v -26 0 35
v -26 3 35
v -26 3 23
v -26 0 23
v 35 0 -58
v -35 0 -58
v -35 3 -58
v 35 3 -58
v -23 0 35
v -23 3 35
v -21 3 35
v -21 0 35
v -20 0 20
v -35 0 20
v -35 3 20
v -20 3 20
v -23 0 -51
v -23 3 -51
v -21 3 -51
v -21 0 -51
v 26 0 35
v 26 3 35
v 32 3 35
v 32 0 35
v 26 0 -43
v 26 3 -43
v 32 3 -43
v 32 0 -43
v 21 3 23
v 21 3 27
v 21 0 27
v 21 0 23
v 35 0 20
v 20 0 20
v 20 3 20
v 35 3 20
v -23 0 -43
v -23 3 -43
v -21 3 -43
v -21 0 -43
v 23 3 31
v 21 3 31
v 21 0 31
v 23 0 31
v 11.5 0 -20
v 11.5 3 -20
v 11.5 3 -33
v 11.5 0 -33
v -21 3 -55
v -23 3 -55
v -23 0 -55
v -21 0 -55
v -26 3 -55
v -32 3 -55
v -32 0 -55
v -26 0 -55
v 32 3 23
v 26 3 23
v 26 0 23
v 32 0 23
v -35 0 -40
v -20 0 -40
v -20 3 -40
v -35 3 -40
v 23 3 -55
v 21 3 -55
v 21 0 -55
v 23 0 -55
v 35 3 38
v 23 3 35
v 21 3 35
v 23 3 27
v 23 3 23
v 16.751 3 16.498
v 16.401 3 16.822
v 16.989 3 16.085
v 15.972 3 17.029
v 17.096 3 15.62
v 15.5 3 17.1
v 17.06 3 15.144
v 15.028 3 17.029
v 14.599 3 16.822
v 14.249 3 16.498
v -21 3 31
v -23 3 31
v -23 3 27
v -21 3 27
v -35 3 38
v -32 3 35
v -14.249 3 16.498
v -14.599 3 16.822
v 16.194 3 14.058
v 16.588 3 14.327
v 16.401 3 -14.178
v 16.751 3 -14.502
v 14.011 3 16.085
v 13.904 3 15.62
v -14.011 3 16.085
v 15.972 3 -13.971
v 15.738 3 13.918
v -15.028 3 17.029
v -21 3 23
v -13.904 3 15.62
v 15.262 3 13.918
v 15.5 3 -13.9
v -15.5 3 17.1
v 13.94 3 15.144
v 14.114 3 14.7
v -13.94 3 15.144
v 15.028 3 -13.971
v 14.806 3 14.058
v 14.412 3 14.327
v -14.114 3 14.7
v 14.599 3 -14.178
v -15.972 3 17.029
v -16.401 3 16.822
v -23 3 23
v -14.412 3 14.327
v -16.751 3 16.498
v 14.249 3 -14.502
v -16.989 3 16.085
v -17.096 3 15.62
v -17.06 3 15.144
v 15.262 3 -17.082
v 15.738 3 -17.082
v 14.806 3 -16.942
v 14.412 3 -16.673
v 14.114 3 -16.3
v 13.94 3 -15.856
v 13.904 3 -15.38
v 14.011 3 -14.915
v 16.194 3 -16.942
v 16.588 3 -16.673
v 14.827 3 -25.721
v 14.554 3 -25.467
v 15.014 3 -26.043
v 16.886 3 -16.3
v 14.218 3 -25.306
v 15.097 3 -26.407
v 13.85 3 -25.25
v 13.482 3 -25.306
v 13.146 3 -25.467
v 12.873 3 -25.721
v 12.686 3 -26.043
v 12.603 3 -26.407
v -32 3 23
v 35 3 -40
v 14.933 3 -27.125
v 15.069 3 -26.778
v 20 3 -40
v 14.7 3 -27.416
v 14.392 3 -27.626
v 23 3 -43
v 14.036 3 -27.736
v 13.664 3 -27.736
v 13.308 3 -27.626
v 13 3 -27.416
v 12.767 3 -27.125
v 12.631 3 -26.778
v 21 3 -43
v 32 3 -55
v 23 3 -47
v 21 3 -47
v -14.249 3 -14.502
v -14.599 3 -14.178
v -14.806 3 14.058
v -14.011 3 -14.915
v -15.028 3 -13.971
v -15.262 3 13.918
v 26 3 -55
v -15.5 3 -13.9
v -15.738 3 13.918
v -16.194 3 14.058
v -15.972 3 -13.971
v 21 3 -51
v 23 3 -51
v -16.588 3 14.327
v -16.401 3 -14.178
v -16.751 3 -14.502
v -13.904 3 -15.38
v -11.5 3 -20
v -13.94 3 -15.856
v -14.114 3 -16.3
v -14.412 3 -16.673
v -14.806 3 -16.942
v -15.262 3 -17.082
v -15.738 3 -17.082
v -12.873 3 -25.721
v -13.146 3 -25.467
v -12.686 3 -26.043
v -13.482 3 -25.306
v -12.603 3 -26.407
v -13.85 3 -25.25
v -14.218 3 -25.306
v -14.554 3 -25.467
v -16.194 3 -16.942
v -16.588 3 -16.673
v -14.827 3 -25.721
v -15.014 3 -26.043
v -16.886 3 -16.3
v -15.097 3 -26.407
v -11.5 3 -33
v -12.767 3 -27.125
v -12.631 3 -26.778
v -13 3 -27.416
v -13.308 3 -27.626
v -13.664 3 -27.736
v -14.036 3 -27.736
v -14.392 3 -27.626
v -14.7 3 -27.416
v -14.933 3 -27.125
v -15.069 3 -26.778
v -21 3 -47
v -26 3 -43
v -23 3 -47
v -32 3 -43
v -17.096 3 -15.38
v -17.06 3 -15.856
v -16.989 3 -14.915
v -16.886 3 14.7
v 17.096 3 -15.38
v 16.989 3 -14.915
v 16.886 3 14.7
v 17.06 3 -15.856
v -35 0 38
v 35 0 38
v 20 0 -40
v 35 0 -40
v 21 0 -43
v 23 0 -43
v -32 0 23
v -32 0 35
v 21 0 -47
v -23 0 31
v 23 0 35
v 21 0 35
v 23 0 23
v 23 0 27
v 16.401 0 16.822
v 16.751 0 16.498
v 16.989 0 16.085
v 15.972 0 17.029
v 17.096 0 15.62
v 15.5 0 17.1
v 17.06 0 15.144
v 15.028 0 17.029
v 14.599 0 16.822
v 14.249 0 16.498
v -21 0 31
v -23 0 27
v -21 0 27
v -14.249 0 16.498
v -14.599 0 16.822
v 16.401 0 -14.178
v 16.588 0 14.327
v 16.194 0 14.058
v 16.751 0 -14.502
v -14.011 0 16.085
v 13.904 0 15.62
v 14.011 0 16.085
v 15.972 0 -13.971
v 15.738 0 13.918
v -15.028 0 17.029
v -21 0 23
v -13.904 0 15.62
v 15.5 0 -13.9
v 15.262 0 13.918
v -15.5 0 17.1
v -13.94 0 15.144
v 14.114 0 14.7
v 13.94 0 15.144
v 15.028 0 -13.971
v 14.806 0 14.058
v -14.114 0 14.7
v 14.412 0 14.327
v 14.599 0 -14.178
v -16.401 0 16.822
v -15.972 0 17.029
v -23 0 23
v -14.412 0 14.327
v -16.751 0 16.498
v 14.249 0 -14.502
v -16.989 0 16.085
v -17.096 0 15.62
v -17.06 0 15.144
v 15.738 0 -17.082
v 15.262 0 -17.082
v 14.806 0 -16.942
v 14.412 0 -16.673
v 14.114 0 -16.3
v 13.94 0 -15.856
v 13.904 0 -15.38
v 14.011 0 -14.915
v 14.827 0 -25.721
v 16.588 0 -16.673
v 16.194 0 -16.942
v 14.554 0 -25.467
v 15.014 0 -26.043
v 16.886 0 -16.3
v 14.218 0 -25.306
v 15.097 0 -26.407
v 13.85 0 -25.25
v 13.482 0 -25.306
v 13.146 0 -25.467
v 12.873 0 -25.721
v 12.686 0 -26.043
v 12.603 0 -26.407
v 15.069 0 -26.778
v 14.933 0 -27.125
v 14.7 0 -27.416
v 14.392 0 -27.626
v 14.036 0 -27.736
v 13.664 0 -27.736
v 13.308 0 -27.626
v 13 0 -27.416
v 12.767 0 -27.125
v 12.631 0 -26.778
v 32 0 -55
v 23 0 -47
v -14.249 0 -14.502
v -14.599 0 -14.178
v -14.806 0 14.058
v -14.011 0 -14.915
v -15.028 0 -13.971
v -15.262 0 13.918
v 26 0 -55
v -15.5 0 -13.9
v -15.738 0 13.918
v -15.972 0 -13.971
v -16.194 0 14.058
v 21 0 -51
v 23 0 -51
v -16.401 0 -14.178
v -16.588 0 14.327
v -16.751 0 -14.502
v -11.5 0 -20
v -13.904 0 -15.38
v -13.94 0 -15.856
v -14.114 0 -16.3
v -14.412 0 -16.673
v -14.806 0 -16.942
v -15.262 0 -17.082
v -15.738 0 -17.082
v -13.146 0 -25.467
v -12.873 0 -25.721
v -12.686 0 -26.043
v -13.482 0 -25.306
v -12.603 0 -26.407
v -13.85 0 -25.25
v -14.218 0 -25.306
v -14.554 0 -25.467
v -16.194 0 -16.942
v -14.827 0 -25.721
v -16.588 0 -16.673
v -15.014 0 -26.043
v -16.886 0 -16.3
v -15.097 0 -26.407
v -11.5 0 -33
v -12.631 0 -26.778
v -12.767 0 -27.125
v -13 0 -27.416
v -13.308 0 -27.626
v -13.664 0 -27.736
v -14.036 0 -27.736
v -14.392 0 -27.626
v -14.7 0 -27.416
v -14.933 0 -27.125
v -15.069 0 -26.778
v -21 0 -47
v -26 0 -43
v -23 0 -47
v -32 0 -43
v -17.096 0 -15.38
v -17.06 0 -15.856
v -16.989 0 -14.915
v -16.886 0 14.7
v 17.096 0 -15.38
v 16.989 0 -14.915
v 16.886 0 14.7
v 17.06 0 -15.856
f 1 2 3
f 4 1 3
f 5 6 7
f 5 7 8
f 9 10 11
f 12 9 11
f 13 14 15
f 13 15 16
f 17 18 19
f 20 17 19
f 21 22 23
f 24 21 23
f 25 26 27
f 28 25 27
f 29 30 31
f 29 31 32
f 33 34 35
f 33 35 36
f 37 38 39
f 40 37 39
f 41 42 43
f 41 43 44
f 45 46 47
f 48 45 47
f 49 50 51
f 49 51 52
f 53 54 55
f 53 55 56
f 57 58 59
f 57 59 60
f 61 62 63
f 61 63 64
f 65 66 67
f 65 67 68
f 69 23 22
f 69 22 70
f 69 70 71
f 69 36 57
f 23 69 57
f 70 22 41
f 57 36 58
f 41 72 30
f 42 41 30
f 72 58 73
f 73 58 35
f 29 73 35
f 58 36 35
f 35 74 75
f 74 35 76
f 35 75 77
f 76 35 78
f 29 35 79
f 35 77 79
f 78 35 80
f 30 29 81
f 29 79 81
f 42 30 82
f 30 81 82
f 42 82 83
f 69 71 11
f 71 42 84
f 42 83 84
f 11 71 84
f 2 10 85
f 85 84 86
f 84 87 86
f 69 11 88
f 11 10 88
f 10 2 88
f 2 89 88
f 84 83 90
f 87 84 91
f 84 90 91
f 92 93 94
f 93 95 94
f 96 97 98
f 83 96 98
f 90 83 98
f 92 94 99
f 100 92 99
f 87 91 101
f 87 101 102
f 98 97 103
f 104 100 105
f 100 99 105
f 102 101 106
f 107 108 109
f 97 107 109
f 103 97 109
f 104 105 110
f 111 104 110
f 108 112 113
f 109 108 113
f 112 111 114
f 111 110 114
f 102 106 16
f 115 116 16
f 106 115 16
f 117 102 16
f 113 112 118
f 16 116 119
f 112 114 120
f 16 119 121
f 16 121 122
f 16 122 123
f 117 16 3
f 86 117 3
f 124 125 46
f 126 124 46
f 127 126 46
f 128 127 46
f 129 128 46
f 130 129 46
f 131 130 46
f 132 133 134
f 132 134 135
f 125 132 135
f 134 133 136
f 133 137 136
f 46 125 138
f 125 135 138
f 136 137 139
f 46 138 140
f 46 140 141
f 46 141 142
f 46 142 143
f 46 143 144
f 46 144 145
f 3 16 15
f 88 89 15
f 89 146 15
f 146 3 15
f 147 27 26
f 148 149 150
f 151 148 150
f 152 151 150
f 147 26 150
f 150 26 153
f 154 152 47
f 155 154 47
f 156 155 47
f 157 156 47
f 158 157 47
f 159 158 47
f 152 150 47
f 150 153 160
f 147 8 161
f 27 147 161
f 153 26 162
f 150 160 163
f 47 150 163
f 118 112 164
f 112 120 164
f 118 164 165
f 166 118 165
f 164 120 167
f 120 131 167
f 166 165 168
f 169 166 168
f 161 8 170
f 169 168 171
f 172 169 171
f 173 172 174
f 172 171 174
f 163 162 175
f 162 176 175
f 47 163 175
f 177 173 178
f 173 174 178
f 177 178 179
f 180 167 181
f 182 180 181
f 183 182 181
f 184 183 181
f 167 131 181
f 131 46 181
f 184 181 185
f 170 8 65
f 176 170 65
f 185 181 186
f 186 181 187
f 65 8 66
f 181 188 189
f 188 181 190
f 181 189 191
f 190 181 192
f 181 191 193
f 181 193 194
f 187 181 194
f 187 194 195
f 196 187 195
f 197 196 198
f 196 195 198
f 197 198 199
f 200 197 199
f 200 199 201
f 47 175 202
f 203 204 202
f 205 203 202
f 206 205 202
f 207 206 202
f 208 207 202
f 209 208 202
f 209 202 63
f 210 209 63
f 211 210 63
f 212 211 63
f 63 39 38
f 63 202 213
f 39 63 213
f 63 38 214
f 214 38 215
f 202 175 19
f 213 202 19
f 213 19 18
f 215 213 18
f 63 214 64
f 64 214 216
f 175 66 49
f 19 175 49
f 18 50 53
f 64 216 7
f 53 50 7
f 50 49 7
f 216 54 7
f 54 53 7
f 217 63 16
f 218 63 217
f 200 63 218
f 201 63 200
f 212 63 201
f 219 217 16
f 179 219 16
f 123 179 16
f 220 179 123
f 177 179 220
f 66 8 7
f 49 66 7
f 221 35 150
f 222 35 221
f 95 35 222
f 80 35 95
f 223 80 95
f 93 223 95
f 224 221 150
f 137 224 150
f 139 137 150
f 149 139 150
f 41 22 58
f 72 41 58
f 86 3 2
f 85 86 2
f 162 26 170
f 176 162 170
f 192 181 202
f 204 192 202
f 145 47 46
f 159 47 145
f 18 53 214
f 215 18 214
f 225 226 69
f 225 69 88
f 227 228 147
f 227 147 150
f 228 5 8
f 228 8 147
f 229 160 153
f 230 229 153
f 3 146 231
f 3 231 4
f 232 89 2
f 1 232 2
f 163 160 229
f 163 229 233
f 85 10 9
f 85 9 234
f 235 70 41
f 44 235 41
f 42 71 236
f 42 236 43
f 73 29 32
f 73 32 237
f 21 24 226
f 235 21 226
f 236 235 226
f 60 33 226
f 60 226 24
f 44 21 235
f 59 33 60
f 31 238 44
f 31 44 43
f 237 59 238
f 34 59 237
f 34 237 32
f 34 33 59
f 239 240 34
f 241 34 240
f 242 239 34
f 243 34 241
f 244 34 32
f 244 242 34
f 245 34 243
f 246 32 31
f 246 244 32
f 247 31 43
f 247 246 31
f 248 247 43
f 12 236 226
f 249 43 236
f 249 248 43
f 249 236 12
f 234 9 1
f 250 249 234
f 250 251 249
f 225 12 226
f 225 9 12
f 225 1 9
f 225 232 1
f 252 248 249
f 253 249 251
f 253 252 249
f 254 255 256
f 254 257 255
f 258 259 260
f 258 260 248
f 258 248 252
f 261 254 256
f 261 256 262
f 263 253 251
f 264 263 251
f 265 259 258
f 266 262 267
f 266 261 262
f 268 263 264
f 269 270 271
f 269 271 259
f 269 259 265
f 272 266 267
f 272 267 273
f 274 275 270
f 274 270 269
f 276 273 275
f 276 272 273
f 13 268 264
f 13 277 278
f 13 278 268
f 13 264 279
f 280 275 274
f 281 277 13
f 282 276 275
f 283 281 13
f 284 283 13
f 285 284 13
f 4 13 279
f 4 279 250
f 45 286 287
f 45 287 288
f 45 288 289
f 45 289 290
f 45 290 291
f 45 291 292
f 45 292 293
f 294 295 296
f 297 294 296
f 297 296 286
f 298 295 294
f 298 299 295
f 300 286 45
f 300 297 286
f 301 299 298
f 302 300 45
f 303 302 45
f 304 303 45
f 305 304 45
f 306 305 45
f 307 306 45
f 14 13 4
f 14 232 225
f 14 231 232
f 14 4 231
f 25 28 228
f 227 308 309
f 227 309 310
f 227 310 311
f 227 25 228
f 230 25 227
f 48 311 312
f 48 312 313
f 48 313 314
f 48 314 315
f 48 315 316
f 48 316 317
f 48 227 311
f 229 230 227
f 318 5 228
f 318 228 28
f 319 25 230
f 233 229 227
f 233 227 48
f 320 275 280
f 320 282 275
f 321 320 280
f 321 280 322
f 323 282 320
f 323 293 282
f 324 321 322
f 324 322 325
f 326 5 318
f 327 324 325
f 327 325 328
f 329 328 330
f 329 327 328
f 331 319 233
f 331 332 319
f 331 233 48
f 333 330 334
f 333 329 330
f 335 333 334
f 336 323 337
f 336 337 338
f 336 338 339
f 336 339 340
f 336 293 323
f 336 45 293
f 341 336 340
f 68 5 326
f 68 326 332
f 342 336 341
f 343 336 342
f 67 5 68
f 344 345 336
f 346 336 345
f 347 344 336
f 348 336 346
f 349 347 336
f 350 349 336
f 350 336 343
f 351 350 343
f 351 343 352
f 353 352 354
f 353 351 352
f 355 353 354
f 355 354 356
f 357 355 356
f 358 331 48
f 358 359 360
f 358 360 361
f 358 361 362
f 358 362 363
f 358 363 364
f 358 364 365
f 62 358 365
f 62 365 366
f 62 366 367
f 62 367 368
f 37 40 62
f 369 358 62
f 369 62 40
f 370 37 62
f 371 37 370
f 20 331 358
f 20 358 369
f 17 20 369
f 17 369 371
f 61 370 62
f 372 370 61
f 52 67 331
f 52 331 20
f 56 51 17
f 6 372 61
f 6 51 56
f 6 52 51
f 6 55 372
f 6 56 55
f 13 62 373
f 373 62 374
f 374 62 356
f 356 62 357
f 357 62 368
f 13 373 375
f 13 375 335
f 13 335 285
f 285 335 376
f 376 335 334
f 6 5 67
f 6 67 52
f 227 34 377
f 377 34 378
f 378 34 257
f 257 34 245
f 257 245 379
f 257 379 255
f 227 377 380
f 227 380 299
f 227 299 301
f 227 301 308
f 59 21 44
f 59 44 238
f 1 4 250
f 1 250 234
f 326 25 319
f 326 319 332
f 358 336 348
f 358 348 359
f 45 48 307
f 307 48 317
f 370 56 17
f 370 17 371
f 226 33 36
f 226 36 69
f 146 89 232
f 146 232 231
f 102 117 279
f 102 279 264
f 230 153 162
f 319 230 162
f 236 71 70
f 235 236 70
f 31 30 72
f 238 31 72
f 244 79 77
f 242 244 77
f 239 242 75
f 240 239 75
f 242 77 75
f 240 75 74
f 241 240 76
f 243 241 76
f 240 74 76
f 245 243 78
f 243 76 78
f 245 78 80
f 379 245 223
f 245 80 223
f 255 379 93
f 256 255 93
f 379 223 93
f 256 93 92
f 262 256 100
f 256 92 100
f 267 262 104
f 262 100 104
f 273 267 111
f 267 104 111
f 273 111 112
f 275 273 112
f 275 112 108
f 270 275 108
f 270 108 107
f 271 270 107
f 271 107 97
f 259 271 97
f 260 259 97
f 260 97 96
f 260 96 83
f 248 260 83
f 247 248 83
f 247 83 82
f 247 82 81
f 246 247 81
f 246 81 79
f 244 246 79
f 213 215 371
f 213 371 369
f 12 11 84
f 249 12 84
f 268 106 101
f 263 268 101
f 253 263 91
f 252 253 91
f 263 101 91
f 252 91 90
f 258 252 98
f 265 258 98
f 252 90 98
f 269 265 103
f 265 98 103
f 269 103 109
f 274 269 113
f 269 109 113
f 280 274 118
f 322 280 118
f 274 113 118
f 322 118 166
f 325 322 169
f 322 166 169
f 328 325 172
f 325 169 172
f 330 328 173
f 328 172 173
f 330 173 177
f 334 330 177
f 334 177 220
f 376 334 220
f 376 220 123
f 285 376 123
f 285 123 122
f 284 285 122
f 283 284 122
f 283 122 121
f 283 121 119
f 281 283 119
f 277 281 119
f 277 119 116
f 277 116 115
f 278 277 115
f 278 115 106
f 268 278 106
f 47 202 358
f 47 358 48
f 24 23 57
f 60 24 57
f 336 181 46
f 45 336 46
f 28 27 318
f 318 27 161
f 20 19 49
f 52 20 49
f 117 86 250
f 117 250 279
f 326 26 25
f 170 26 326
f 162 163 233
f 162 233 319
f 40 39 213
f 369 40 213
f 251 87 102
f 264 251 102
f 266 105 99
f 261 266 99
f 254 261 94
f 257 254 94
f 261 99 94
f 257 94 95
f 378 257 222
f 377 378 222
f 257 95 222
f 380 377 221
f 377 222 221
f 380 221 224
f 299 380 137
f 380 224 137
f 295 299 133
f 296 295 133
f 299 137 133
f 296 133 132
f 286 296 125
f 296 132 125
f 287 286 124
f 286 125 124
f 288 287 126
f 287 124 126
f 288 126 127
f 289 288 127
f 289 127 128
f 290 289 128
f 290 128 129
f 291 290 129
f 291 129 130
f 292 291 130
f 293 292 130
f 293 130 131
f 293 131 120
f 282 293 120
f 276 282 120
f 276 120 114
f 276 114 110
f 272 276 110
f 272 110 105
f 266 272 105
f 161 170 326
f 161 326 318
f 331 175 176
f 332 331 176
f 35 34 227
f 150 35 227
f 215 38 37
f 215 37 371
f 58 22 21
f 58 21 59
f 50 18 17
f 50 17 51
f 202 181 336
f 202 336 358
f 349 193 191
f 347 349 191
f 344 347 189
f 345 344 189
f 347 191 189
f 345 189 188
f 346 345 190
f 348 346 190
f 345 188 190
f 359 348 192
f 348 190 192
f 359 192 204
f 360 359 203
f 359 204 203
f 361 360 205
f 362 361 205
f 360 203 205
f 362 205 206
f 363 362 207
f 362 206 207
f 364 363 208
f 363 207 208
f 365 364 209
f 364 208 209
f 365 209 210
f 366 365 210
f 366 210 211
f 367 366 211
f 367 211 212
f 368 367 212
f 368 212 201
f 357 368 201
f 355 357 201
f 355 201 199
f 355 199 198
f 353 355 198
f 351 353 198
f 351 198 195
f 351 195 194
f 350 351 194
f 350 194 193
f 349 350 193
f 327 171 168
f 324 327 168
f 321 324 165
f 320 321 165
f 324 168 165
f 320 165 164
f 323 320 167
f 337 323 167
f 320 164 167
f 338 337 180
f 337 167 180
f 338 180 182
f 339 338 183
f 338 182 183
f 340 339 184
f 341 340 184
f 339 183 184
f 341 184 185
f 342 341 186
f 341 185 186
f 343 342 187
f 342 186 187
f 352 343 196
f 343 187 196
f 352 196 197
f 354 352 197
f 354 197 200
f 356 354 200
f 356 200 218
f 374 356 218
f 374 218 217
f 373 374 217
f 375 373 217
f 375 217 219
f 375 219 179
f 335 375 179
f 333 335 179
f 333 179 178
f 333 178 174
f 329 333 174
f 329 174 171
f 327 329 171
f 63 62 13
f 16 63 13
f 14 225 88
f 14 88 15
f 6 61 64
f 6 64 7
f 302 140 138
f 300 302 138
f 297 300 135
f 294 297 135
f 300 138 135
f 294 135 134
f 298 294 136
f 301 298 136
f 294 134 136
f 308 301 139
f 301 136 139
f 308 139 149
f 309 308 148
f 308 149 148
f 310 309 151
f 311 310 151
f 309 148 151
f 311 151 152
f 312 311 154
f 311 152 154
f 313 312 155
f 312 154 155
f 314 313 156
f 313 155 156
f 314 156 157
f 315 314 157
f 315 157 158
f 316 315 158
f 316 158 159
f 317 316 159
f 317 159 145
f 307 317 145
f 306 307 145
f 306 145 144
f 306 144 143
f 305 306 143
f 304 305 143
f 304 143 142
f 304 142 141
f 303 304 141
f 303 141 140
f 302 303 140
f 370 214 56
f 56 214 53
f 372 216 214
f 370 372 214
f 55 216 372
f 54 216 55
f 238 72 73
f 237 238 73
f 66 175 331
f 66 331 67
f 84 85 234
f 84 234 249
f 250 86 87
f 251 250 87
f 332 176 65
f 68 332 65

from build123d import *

# Parameters (mm, degrees)
EXTRUDE_1_DEPTH     = 3
CUT_EXTRUDE_1_REACH = 69.809
SKETCH_2_R          = 1.6
SKETCH_2_R_2        = 1.25
SKETCH_2_W          = 23
SKETCH_2_H          = 13
SKETCH_2_W_2        = 2
SKETCH_2_H_2        = 4
SKETCH_2_W_3        = 6
SKETCH_2_H_3        = 12


with BuildPart() as part:
    # 草图1 → 凸台-拉伸1 (new body)
    with BuildSketch(Plane(origin=(0, 0, 0), x_dir=(1, 0, 0), z_dir=(0, 1, 0))):
        Polygon((20, -20), (35, -20), (35, -38), (-35, -38), (-35, -20), (-20, -20), (-20, 20), (-20, 40), (-35, 40), (-35, 58), (35, 58), (35, 40), (20, 40), (20, 20), align=None)
    extrude(amount=EXTRUDE_1_DEPTH)

    # 草图2 → 切除-拉伸1 (cut, up to next)
    with BuildSketch(Plane(origin=(0, 3, 0), x_dir=(1, 0, 0), z_dir=(0, 1, 0)), mode=Mode.PRIVATE) as cut_extrude_1_sk1:
        with Locations(Location((-15.5, -15.5, 0), (0, 0, 270))):
            Circle(SKETCH_2_R)
    cut_extrude_1_tool1 = extrude(cut_extrude_1_sk1.sketch, amount=-CUT_EXTRUDE_1_REACH, mode=Mode.PRIVATE) & part.part
    # 草图2 → 切除-拉伸1 (cut, up to next)
    with BuildSketch(Plane(origin=(0, 3, 0), x_dir=(1, 0, 0), z_dir=(0, 1, 0)), mode=Mode.PRIVATE) as cut_extrude_1_sk2:
        with Locations(Location((-15.5, 15.5, 0), (0, 0, 270))):
            Circle(SKETCH_2_R)
    cut_extrude_1_tool2 = extrude(cut_extrude_1_sk2.sketch, amount=-CUT_EXTRUDE_1_REACH, mode=Mode.PRIVATE) & part.part
    # 草图2 → 切除-拉伸1 (cut, up to next)
    with BuildSketch(Plane(origin=(0, 3, 0), x_dir=(1, 0, 0), z_dir=(0, 1, 0)), mode=Mode.PRIVATE) as cut_extrude_1_sk3:
        with Locations(Location((15.5, -15.5, 0), (0, 0, 270))):
            Circle(SKETCH_2_R)
    cut_extrude_1_tool3 = extrude(cut_extrude_1_sk3.sketch, amount=-CUT_EXTRUDE_1_REACH, mode=Mode.PRIVATE) & part.part
    # 草图2 → 切除-拉伸1 (cut, up to next)
    with BuildSketch(Plane(origin=(0, 3, 0), x_dir=(1, 0, 0), z_dir=(0, 1, 0)), mode=Mode.PRIVATE) as cut_extrude_1_sk4:
        with Locations(Location((15.5, 15.5, 0), (0, 0, 270))):
            Circle(SKETCH_2_R)
    cut_extrude_1_tool4 = extrude(cut_extrude_1_sk4.sketch, amount=-CUT_EXTRUDE_1_REACH, mode=Mode.PRIVATE) & part.part
    # 草图2 → 切除-拉伸1 (cut, up to next)
    with BuildSketch(Plane(origin=(0, 3, 0), x_dir=(1, 0, 0), z_dir=(0, 1, 0)), mode=Mode.PRIVATE) as cut_extrude_1_sk5:
        with Locations(Location((-13.85, 26.5, 0), (0, 0, 270))):
            Circle(SKETCH_2_R_2)
    cut_extrude_1_tool5 = extrude(cut_extrude_1_sk5.sketch, amount=-CUT_EXTRUDE_1_REACH, mode=Mode.PRIVATE) & part.part
    # 草图2 → 切除-拉伸1 (cut, up to next)
    with BuildSketch(Plane(origin=(0, 3, 0), x_dir=(1, 0, 0), z_dir=(0, 1, 0)), mode=Mode.PRIVATE) as cut_extrude_1_sk6:
        with Locations(Location((13.85, 26.5, 0), (0, 0, 270))):
            Circle(SKETCH_2_R_2)
    cut_extrude_1_tool6 = extrude(cut_extrude_1_sk6.sketch, amount=-CUT_EXTRUDE_1_REACH, mode=Mode.PRIVATE) & part.part
    # 草图2 → 切除-拉伸1 (cut, up to next)
    with BuildSketch(Plane(origin=(0, 3, 0), x_dir=(1, 0, 0), z_dir=(0, 1, 0)), mode=Mode.PRIVATE) as cut_extrude_1_sk7:
        with Locations((0, 26.5)):
            Rectangle(SKETCH_2_W, SKETCH_2_H)
    cut_extrude_1_tool7 = extrude(cut_extrude_1_sk7.sketch, amount=-CUT_EXTRUDE_1_REACH, mode=Mode.PRIVATE) & part.part
    # 草图2 → 切除-拉伸1 (cut, up to next)
    with BuildSketch(Plane(origin=(0, 3, 0), x_dir=(1, 0, 0), z_dir=(0, 1, 0)), mode=Mode.PRIVATE) as cut_extrude_1_sk8:
        with Locations((-22, -33)):
            Rectangle(SKETCH_2_W_2, SKETCH_2_H_2)
    cut_extrude_1_tool8 = extrude(cut_extrude_1_sk8.sketch, amount=-CUT_EXTRUDE_1_REACH, mode=Mode.PRIVATE) & part.part
    # 草图2 → 切除-拉伸1 (cut, up to next)
    with BuildSketch(Plane(origin=(0, 3, 0), x_dir=(1, 0, 0), z_dir=(0, 1, 0)), mode=Mode.PRIVATE) as cut_extrude_1_sk9:
        with Locations((-29, -29)):
            Rectangle(SKETCH_2_W_3, SKETCH_2_H_3)
    cut_extrude_1_tool9 = extrude(cut_extrude_1_sk9.sketch, amount=-CUT_EXTRUDE_1_REACH, mode=Mode.PRIVATE) & part.part
    # 草图2 → 切除-拉伸1 (cut, up to next)
    with BuildSketch(Plane(origin=(0, 3, 0), x_dir=(1, 0, 0), z_dir=(0, 1, 0)), mode=Mode.PRIVATE) as cut_extrude_1_sk10:
        with Locations((-22, -25)):
            Rectangle(SKETCH_2_W_2, SKETCH_2_H_2)
    cut_extrude_1_tool10 = extrude(cut_extrude_1_sk10.sketch, amount=-CUT_EXTRUDE_1_REACH, mode=Mode.PRIVATE) & part.part
    # 草图2 → 切除-拉伸1 (cut, up to next)
    with BuildSketch(Plane(origin=(0, 3, 0), x_dir=(1, 0, 0), z_dir=(0, 1, 0)), mode=Mode.PRIVATE) as cut_extrude_1_sk11:
        with Locations((22, -33)):
            Rectangle(SKETCH_2_W_2, SKETCH_2_H_2)
    cut_extrude_1_tool11 = extrude(cut_extrude_1_sk11.sketch, amount=-CUT_EXTRUDE_1_REACH, mode=Mode.PRIVATE) & part.part
    # 草图2 → 切除-拉伸1 (cut, up to next)
    with BuildSketch(Plane(origin=(0, 3, 0), x_dir=(1, 0, 0), z_dir=(0, 1, 0)), mode=Mode.PRIVATE) as cut_extrude_1_sk12:
        with Locations((22, -25)):
            Rectangle(SKETCH_2_W_2, SKETCH_2_H_2)
    cut_extrude_1_tool12 = extrude(cut_extrude_1_sk12.sketch, amount=-CUT_EXTRUDE_1_REACH, mode=Mode.PRIVATE) & part.part
    # 草图2 → 切除-拉伸1 (cut, up to next)
    with BuildSketch(Plane(origin=(0, 3, 0), x_dir=(1, 0, 0), z_dir=(0, 1, 0)), mode=Mode.PRIVATE) as cut_extrude_1_sk13:
        with Locations((29, -29)):
            Rectangle(SKETCH_2_W_3, SKETCH_2_H_3)
    cut_extrude_1_tool13 = extrude(cut_extrude_1_sk13.sketch, amount=-CUT_EXTRUDE_1_REACH, mode=Mode.PRIVATE) & part.part
    # 草图2 → 切除-拉伸1 (cut, up to next)
    with BuildSketch(Plane(origin=(0, 3, 0), x_dir=(1, 0, 0), z_dir=(0, 1, 0)), mode=Mode.PRIVATE) as cut_extrude_1_sk14:
        with Locations((-22, 45)):
            Rectangle(SKETCH_2_W_2, SKETCH_2_H_2)
    cut_extrude_1_tool14 = extrude(cut_extrude_1_sk14.sketch, amount=-CUT_EXTRUDE_1_REACH, mode=Mode.PRIVATE) & part.part
    # 草图2 → 切除-拉伸1 (cut, up to next)
    with BuildSketch(Plane(origin=(0, 3, 0), x_dir=(1, 0, 0), z_dir=(0, 1, 0)), mode=Mode.PRIVATE) as cut_extrude_1_sk15:
        with Locations((-29, 49)):
            Rectangle(SKETCH_2_W_3, SKETCH_2_H_3)
    cut_extrude_1_tool15 = extrude(cut_extrude_1_sk15.sketch, amount=-CUT_EXTRUDE_1_REACH, mode=Mode.PRIVATE) & part.part
    # 草图2 → 切除-拉伸1 (cut, up to next)
    with BuildSketch(Plane(origin=(0, 3, 0), x_dir=(1, 0, 0), z_dir=(0, 1, 0)), mode=Mode.PRIVATE) as cut_extrude_1_sk16:
        with Locations((-22, 53)):
            Rectangle(SKETCH_2_W_2, SKETCH_2_H_2)
    cut_extrude_1_tool16 = extrude(cut_extrude_1_sk16.sketch, amount=-CUT_EXTRUDE_1_REACH, mode=Mode.PRIVATE) & part.part
    # 草图2 → 切除-拉伸1 (cut, up to next)
    with BuildSketch(Plane(origin=(0, 3, 0), x_dir=(1, 0, 0), z_dir=(0, 1, 0)), mode=Mode.PRIVATE) as cut_extrude_1_sk17:
        with Locations((22, 45)):
            Rectangle(SKETCH_2_W_2, SKETCH_2_H_2)
    cut_extrude_1_tool17 = extrude(cut_extrude_1_sk17.sketch, amount=-CUT_EXTRUDE_1_REACH, mode=Mode.PRIVATE) & part.part
    # 草图2 → 切除-拉伸1 (cut, up to next)
    with BuildSketch(Plane(origin=(0, 3, 0), x_dir=(1, 0, 0), z_dir=(0, 1, 0)), mode=Mode.PRIVATE) as cut_extrude_1_sk18:
        with Locations((22, 53)):
            Rectangle(SKETCH_2_W_2, SKETCH_2_H_2)
    cut_extrude_1_tool18 = extrude(cut_extrude_1_sk18.sketch, amount=-CUT_EXTRUDE_1_REACH, mode=Mode.PRIVATE) & part.part
    # 草图2 → 切除-拉伸1 (cut, up to next)
    with BuildSketch(Plane(origin=(0, 3, 0), x_dir=(1, 0, 0), z_dir=(0, 1, 0)), mode=Mode.PRIVATE) as cut_extrude_1_sk19:
        with Locations((29, 49)):
            Rectangle(SKETCH_2_W_3, SKETCH_2_H_3)
    cut_extrude_1_tool19 = extrude(cut_extrude_1_sk19.sketch, amount=-CUT_EXTRUDE_1_REACH, mode=Mode.PRIVATE) & part.part
    add(cut_extrude_1_tool1.solids().sort_by_distance((-15.5, 3, 15.5))[0], mode=Mode.SUBTRACT)
    add(cut_extrude_1_tool2.solids().sort_by_distance((-15.5, 3, -15.5))[0], mode=Mode.SUBTRACT)
    add(cut_extrude_1_tool3.solids().sort_by_distance((15.5, 3, 15.5))[0], mode=Mode.SUBTRACT)
    add(cut_extrude_1_tool4.solids().sort_by_distance((15.5, 3, -15.5))[0], mode=Mode.SUBTRACT)
    add(cut_extrude_1_tool5.solids().sort_by_distance((-13.85, 3, -26.5))[0], mode=Mode.SUBTRACT)
    add(cut_extrude_1_tool6.solids().sort_by_distance((13.85, 3, -26.5))[0], mode=Mode.SUBTRACT)
    add(cut_extrude_1_tool7.solids().sort_by_distance((0, 3, -26.5))[0], mode=Mode.SUBTRACT)
    add(cut_extrude_1_tool8.solids().sort_by_distance((-22, 3, 33))[0], mode=Mode.SUBTRACT)
    add(cut_extrude_1_tool9.solids().sort_by_distance((-29, 3, 29))[0], mode=Mode.SUBTRACT)
    add(cut_extrude_1_tool10.solids().sort_by_distance((-22, 3, 25))[0], mode=Mode.SUBTRACT)
    add(cut_extrude_1_tool11.solids().sort_by_distance((22, 3, 33))[0], mode=Mode.SUBTRACT)
    add(cut_extrude_1_tool12.solids().sort_by_distance((22, 3, 25))[0], mode=Mode.SUBTRACT)
    add(cut_extrude_1_tool13.solids().sort_by_distance((29, 3, 29))[0], mode=Mode.SUBTRACT)
    add(cut_extrude_1_tool14.solids().sort_by_distance((-22, 3, -45))[0], mode=Mode.SUBTRACT)
    add(cut_extrude_1_tool15.solids().sort_by_distance((-29, 3, -49))[0], mode=Mode.SUBTRACT)
    add(cut_extrude_1_tool16.solids().sort_by_distance((-22, 3, -53))[0], mode=Mode.SUBTRACT)
    add(cut_extrude_1_tool17.solids().sort_by_distance((22, 3, -45))[0], mode=Mode.SUBTRACT)
    add(cut_extrude_1_tool18.solids().sort_by_distance((22, 3, -53))[0], mode=Mode.SUBTRACT)
    add(cut_extrude_1_tool19.solids().sort_by_distance((29, 3, -49))[0], mode=Mode.SUBTRACT)


solid = part.part
